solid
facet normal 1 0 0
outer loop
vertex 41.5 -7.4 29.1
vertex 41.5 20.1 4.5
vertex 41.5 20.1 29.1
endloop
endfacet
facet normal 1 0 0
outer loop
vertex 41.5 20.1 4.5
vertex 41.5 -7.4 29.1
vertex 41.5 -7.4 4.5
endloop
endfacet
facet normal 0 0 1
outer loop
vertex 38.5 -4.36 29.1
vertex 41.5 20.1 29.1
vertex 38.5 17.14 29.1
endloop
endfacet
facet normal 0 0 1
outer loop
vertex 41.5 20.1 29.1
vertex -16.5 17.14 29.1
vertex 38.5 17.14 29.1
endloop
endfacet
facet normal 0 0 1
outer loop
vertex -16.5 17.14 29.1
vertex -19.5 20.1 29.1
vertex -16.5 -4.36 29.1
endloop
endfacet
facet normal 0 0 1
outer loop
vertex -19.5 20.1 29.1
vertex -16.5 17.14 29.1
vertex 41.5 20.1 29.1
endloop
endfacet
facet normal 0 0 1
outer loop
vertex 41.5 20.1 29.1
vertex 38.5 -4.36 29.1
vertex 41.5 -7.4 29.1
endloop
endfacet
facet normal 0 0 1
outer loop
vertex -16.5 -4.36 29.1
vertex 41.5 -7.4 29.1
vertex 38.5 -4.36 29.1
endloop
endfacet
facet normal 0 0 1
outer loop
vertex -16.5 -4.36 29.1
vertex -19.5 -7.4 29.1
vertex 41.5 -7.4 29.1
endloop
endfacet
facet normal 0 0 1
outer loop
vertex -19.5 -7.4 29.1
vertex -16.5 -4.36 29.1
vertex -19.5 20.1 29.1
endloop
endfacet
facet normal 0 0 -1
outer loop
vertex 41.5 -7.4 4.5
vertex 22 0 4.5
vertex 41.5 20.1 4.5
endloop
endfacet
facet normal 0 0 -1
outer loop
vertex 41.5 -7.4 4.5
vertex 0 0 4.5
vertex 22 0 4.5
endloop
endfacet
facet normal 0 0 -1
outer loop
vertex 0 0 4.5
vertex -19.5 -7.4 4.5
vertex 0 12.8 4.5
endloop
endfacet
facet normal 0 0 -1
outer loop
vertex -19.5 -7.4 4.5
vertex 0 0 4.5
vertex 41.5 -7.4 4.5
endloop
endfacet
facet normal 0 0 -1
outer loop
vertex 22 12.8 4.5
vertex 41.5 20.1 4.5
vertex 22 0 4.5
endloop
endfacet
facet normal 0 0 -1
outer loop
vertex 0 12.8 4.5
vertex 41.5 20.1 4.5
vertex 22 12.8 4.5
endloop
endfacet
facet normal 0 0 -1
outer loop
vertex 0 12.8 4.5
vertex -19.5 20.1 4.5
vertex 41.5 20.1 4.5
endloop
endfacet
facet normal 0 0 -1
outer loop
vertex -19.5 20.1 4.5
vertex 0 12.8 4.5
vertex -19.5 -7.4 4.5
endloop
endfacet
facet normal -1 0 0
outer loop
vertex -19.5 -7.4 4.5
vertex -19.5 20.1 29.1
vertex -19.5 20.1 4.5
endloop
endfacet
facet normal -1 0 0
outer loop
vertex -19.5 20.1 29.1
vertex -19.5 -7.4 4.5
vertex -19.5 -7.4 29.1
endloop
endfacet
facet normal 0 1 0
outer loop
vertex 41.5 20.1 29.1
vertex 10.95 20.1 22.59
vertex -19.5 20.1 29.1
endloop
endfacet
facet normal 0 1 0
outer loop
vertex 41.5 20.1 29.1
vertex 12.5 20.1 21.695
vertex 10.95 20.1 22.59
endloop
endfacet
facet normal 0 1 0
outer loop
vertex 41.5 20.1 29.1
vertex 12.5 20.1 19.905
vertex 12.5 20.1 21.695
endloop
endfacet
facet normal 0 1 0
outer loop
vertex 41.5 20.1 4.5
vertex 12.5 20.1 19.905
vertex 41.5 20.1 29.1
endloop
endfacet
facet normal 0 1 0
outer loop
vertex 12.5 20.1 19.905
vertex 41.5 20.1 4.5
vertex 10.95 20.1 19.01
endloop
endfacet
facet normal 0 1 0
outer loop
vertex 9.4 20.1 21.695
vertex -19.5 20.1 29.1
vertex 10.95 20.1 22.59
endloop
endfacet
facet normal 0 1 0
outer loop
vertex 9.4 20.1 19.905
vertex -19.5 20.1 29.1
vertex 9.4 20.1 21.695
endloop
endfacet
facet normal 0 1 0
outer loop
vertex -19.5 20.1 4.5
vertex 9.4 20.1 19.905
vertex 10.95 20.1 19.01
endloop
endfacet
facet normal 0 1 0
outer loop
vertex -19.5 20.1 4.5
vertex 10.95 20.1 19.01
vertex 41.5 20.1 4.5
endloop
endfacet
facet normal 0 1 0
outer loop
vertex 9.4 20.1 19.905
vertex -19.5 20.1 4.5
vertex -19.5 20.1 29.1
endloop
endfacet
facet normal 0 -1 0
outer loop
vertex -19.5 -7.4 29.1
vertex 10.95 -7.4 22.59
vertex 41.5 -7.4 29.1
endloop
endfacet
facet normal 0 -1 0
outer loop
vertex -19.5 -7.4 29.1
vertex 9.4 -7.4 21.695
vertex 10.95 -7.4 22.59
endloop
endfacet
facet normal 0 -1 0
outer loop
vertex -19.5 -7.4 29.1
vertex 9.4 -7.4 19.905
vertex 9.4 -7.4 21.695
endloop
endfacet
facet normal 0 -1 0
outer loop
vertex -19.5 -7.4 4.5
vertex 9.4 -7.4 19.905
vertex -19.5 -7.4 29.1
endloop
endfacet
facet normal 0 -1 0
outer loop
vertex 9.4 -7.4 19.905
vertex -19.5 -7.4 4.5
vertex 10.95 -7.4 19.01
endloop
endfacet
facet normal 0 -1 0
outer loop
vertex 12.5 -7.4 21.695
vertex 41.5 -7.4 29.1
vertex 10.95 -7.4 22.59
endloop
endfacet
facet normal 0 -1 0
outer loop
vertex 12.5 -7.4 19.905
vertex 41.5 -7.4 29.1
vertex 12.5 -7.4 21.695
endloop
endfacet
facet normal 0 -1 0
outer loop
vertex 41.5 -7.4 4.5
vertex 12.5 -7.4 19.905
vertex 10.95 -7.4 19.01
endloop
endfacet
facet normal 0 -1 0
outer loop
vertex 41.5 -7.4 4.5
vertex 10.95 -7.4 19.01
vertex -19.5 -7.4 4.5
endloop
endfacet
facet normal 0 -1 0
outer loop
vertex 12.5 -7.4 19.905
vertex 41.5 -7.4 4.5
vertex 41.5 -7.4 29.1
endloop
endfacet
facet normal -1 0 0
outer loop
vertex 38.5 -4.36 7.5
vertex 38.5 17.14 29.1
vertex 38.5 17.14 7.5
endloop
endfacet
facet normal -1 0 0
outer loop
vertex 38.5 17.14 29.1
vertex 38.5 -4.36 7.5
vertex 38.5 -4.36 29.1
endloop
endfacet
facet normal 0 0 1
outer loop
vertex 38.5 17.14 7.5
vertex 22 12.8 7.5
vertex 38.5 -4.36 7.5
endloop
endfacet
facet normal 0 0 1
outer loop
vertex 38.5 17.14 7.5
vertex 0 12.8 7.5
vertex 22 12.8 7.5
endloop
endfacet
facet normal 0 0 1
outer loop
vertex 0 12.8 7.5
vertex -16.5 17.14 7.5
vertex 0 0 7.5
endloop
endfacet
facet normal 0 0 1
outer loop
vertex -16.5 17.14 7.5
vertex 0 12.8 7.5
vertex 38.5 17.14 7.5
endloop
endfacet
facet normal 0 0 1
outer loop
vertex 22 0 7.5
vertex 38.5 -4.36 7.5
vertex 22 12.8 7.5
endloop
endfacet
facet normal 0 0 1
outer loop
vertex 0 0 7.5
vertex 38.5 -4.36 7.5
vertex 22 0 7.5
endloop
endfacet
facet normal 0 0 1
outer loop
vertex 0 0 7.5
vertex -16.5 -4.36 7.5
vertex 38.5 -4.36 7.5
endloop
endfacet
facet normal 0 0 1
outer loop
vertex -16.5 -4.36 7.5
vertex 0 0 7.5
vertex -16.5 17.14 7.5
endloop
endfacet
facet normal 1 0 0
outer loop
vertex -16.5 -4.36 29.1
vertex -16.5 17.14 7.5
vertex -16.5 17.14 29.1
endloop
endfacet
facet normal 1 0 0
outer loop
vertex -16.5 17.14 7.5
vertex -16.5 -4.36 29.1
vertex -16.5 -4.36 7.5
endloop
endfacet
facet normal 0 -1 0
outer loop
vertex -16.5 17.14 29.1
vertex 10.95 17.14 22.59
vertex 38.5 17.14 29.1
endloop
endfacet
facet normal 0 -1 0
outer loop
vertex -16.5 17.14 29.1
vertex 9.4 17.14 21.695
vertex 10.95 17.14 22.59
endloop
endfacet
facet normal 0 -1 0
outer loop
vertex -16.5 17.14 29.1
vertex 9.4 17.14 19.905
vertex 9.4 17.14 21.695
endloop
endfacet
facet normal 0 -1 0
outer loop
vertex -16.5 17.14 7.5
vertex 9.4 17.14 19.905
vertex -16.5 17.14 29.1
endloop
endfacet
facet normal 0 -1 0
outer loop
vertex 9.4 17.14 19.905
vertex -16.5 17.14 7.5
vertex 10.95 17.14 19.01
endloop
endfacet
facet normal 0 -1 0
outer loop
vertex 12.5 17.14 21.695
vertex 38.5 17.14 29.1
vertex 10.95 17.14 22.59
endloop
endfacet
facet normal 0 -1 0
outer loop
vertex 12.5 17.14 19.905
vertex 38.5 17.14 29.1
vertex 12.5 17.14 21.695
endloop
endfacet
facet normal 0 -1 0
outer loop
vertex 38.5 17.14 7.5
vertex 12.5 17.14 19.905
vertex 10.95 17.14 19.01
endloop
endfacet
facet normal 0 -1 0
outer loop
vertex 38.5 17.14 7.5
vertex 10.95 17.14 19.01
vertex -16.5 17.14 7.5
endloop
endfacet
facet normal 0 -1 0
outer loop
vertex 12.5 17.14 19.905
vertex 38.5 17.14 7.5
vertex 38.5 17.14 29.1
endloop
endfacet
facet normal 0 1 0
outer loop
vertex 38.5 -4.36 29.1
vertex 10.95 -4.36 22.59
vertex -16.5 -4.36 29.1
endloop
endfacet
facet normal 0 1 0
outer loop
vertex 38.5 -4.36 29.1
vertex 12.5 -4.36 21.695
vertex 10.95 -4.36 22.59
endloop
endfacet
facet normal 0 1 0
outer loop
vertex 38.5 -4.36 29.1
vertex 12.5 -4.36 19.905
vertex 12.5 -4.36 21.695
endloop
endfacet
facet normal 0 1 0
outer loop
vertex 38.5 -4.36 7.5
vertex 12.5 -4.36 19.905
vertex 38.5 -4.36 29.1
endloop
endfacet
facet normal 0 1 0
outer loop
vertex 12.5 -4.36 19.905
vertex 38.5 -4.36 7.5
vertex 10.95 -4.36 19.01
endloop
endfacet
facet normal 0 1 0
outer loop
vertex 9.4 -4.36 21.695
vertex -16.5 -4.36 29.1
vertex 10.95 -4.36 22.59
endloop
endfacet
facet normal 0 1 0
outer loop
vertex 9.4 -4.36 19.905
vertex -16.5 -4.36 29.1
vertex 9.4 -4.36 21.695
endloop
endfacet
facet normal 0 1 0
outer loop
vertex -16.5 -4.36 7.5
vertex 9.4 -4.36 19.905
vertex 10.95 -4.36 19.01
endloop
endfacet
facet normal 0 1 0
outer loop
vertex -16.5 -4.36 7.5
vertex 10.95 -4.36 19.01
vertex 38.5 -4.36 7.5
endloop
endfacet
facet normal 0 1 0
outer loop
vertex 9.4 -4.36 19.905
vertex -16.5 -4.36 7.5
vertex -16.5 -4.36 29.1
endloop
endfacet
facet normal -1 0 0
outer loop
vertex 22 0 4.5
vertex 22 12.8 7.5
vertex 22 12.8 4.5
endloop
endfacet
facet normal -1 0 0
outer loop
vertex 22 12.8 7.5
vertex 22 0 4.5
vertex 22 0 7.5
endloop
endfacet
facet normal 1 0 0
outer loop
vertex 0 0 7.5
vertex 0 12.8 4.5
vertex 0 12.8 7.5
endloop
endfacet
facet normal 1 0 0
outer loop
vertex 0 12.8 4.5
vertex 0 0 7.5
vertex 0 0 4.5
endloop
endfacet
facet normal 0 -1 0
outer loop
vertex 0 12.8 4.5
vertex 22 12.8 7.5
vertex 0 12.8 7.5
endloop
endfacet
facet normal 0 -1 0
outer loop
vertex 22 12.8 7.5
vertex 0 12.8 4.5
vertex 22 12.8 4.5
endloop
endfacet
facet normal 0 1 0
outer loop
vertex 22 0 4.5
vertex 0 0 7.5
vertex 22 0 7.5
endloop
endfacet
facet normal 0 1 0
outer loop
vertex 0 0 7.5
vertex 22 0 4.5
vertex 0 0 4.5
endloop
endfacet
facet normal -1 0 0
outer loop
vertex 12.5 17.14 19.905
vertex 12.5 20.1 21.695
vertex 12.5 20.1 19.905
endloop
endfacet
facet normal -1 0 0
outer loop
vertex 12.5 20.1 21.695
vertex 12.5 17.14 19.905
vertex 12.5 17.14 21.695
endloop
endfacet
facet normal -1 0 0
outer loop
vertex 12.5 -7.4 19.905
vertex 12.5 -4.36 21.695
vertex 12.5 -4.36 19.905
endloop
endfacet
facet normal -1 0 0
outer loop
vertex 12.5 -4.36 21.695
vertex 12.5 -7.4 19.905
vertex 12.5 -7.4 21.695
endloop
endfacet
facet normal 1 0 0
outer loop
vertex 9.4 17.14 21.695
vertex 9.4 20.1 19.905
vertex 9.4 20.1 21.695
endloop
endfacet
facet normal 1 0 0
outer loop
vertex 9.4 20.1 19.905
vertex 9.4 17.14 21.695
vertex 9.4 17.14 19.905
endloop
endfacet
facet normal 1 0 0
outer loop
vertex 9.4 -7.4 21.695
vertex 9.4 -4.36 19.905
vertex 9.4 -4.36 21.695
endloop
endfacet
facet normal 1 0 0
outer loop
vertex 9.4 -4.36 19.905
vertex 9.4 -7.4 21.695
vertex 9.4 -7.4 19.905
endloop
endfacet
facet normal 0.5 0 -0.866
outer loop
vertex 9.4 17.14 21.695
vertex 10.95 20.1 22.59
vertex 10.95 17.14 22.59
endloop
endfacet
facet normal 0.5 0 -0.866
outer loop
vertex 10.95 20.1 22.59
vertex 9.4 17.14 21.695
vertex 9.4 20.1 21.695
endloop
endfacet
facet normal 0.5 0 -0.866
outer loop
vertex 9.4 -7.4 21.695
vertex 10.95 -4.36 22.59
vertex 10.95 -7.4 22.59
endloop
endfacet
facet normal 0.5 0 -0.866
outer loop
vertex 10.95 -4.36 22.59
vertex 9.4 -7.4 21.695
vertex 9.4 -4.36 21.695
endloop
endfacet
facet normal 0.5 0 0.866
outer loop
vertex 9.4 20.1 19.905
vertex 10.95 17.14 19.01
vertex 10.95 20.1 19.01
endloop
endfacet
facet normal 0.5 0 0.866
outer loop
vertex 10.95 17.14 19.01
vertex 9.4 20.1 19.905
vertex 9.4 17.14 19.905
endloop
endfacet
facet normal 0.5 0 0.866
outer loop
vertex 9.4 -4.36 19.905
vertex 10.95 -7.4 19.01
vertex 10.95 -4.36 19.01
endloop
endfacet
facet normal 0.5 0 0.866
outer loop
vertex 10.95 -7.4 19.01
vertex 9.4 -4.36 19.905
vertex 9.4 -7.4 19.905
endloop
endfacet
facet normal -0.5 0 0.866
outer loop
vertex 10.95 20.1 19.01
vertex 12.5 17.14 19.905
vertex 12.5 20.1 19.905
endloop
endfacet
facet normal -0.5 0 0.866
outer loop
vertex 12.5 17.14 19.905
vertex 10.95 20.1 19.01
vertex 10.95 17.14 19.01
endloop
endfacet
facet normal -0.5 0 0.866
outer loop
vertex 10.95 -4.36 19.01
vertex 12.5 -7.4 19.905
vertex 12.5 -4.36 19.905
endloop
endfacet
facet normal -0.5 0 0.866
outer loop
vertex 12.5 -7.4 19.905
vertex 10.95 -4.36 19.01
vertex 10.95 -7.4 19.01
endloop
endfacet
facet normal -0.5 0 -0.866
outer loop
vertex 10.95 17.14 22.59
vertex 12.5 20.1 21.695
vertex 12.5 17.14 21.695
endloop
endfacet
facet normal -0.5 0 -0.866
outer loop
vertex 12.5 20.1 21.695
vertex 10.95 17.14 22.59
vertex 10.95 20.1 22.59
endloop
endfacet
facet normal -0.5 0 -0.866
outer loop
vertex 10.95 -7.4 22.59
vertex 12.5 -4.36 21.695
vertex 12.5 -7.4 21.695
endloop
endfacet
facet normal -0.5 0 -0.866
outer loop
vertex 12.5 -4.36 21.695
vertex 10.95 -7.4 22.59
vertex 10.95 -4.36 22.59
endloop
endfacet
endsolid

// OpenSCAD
/* the 3 position switch */
/*union() color("silver") {
    cube([21.9,12.7,7.8]);
    translate([-6.65,0.95,7.5]) {
        cube([35.2,10.8,0.3]);
    }
}
translate([7.7,3.7,7.8]) color("black") {
        cube ([6.5,5.4,7.9]);
}
*/

/* housing */
module polyhole(h, d) {
    n = max(round(2 * d),3);
    rotate([0,0,180])
        cylinder(h = h, r = (d / 2) / cos (180 / n), $fn = n);
}

difference() {
    /* outer */
    translate([-19.5,-7.4,4.5]) {
        cube([61,27.5,24.6]);
    }
    /* inner */
    translate([-16.5,-4.36,7.5]) {
        cube([55,21.5,29.6]);
    }
    /* bottom hole */
    cube([22,12.8,7.8]);
    translate([10.95,22.5,20.8]) {
        /* rod hole */
        rotate(a=[90,90,0]) {
            polyhole(h = 32, d = 3.1);
        }
    }
}

/* Button Dimensions */
/*
  cap:
  L: 51.8mm
  W: 21.5mm
  D: 12.33mm

  descenders:
  W of triangle: 12.12mm
  D of triangle: 19.37mm
  width of all 3 triangles: 14.55mm

  3 mm throw for the switch
  3.1 mm diameter for button pivot rod

*/
